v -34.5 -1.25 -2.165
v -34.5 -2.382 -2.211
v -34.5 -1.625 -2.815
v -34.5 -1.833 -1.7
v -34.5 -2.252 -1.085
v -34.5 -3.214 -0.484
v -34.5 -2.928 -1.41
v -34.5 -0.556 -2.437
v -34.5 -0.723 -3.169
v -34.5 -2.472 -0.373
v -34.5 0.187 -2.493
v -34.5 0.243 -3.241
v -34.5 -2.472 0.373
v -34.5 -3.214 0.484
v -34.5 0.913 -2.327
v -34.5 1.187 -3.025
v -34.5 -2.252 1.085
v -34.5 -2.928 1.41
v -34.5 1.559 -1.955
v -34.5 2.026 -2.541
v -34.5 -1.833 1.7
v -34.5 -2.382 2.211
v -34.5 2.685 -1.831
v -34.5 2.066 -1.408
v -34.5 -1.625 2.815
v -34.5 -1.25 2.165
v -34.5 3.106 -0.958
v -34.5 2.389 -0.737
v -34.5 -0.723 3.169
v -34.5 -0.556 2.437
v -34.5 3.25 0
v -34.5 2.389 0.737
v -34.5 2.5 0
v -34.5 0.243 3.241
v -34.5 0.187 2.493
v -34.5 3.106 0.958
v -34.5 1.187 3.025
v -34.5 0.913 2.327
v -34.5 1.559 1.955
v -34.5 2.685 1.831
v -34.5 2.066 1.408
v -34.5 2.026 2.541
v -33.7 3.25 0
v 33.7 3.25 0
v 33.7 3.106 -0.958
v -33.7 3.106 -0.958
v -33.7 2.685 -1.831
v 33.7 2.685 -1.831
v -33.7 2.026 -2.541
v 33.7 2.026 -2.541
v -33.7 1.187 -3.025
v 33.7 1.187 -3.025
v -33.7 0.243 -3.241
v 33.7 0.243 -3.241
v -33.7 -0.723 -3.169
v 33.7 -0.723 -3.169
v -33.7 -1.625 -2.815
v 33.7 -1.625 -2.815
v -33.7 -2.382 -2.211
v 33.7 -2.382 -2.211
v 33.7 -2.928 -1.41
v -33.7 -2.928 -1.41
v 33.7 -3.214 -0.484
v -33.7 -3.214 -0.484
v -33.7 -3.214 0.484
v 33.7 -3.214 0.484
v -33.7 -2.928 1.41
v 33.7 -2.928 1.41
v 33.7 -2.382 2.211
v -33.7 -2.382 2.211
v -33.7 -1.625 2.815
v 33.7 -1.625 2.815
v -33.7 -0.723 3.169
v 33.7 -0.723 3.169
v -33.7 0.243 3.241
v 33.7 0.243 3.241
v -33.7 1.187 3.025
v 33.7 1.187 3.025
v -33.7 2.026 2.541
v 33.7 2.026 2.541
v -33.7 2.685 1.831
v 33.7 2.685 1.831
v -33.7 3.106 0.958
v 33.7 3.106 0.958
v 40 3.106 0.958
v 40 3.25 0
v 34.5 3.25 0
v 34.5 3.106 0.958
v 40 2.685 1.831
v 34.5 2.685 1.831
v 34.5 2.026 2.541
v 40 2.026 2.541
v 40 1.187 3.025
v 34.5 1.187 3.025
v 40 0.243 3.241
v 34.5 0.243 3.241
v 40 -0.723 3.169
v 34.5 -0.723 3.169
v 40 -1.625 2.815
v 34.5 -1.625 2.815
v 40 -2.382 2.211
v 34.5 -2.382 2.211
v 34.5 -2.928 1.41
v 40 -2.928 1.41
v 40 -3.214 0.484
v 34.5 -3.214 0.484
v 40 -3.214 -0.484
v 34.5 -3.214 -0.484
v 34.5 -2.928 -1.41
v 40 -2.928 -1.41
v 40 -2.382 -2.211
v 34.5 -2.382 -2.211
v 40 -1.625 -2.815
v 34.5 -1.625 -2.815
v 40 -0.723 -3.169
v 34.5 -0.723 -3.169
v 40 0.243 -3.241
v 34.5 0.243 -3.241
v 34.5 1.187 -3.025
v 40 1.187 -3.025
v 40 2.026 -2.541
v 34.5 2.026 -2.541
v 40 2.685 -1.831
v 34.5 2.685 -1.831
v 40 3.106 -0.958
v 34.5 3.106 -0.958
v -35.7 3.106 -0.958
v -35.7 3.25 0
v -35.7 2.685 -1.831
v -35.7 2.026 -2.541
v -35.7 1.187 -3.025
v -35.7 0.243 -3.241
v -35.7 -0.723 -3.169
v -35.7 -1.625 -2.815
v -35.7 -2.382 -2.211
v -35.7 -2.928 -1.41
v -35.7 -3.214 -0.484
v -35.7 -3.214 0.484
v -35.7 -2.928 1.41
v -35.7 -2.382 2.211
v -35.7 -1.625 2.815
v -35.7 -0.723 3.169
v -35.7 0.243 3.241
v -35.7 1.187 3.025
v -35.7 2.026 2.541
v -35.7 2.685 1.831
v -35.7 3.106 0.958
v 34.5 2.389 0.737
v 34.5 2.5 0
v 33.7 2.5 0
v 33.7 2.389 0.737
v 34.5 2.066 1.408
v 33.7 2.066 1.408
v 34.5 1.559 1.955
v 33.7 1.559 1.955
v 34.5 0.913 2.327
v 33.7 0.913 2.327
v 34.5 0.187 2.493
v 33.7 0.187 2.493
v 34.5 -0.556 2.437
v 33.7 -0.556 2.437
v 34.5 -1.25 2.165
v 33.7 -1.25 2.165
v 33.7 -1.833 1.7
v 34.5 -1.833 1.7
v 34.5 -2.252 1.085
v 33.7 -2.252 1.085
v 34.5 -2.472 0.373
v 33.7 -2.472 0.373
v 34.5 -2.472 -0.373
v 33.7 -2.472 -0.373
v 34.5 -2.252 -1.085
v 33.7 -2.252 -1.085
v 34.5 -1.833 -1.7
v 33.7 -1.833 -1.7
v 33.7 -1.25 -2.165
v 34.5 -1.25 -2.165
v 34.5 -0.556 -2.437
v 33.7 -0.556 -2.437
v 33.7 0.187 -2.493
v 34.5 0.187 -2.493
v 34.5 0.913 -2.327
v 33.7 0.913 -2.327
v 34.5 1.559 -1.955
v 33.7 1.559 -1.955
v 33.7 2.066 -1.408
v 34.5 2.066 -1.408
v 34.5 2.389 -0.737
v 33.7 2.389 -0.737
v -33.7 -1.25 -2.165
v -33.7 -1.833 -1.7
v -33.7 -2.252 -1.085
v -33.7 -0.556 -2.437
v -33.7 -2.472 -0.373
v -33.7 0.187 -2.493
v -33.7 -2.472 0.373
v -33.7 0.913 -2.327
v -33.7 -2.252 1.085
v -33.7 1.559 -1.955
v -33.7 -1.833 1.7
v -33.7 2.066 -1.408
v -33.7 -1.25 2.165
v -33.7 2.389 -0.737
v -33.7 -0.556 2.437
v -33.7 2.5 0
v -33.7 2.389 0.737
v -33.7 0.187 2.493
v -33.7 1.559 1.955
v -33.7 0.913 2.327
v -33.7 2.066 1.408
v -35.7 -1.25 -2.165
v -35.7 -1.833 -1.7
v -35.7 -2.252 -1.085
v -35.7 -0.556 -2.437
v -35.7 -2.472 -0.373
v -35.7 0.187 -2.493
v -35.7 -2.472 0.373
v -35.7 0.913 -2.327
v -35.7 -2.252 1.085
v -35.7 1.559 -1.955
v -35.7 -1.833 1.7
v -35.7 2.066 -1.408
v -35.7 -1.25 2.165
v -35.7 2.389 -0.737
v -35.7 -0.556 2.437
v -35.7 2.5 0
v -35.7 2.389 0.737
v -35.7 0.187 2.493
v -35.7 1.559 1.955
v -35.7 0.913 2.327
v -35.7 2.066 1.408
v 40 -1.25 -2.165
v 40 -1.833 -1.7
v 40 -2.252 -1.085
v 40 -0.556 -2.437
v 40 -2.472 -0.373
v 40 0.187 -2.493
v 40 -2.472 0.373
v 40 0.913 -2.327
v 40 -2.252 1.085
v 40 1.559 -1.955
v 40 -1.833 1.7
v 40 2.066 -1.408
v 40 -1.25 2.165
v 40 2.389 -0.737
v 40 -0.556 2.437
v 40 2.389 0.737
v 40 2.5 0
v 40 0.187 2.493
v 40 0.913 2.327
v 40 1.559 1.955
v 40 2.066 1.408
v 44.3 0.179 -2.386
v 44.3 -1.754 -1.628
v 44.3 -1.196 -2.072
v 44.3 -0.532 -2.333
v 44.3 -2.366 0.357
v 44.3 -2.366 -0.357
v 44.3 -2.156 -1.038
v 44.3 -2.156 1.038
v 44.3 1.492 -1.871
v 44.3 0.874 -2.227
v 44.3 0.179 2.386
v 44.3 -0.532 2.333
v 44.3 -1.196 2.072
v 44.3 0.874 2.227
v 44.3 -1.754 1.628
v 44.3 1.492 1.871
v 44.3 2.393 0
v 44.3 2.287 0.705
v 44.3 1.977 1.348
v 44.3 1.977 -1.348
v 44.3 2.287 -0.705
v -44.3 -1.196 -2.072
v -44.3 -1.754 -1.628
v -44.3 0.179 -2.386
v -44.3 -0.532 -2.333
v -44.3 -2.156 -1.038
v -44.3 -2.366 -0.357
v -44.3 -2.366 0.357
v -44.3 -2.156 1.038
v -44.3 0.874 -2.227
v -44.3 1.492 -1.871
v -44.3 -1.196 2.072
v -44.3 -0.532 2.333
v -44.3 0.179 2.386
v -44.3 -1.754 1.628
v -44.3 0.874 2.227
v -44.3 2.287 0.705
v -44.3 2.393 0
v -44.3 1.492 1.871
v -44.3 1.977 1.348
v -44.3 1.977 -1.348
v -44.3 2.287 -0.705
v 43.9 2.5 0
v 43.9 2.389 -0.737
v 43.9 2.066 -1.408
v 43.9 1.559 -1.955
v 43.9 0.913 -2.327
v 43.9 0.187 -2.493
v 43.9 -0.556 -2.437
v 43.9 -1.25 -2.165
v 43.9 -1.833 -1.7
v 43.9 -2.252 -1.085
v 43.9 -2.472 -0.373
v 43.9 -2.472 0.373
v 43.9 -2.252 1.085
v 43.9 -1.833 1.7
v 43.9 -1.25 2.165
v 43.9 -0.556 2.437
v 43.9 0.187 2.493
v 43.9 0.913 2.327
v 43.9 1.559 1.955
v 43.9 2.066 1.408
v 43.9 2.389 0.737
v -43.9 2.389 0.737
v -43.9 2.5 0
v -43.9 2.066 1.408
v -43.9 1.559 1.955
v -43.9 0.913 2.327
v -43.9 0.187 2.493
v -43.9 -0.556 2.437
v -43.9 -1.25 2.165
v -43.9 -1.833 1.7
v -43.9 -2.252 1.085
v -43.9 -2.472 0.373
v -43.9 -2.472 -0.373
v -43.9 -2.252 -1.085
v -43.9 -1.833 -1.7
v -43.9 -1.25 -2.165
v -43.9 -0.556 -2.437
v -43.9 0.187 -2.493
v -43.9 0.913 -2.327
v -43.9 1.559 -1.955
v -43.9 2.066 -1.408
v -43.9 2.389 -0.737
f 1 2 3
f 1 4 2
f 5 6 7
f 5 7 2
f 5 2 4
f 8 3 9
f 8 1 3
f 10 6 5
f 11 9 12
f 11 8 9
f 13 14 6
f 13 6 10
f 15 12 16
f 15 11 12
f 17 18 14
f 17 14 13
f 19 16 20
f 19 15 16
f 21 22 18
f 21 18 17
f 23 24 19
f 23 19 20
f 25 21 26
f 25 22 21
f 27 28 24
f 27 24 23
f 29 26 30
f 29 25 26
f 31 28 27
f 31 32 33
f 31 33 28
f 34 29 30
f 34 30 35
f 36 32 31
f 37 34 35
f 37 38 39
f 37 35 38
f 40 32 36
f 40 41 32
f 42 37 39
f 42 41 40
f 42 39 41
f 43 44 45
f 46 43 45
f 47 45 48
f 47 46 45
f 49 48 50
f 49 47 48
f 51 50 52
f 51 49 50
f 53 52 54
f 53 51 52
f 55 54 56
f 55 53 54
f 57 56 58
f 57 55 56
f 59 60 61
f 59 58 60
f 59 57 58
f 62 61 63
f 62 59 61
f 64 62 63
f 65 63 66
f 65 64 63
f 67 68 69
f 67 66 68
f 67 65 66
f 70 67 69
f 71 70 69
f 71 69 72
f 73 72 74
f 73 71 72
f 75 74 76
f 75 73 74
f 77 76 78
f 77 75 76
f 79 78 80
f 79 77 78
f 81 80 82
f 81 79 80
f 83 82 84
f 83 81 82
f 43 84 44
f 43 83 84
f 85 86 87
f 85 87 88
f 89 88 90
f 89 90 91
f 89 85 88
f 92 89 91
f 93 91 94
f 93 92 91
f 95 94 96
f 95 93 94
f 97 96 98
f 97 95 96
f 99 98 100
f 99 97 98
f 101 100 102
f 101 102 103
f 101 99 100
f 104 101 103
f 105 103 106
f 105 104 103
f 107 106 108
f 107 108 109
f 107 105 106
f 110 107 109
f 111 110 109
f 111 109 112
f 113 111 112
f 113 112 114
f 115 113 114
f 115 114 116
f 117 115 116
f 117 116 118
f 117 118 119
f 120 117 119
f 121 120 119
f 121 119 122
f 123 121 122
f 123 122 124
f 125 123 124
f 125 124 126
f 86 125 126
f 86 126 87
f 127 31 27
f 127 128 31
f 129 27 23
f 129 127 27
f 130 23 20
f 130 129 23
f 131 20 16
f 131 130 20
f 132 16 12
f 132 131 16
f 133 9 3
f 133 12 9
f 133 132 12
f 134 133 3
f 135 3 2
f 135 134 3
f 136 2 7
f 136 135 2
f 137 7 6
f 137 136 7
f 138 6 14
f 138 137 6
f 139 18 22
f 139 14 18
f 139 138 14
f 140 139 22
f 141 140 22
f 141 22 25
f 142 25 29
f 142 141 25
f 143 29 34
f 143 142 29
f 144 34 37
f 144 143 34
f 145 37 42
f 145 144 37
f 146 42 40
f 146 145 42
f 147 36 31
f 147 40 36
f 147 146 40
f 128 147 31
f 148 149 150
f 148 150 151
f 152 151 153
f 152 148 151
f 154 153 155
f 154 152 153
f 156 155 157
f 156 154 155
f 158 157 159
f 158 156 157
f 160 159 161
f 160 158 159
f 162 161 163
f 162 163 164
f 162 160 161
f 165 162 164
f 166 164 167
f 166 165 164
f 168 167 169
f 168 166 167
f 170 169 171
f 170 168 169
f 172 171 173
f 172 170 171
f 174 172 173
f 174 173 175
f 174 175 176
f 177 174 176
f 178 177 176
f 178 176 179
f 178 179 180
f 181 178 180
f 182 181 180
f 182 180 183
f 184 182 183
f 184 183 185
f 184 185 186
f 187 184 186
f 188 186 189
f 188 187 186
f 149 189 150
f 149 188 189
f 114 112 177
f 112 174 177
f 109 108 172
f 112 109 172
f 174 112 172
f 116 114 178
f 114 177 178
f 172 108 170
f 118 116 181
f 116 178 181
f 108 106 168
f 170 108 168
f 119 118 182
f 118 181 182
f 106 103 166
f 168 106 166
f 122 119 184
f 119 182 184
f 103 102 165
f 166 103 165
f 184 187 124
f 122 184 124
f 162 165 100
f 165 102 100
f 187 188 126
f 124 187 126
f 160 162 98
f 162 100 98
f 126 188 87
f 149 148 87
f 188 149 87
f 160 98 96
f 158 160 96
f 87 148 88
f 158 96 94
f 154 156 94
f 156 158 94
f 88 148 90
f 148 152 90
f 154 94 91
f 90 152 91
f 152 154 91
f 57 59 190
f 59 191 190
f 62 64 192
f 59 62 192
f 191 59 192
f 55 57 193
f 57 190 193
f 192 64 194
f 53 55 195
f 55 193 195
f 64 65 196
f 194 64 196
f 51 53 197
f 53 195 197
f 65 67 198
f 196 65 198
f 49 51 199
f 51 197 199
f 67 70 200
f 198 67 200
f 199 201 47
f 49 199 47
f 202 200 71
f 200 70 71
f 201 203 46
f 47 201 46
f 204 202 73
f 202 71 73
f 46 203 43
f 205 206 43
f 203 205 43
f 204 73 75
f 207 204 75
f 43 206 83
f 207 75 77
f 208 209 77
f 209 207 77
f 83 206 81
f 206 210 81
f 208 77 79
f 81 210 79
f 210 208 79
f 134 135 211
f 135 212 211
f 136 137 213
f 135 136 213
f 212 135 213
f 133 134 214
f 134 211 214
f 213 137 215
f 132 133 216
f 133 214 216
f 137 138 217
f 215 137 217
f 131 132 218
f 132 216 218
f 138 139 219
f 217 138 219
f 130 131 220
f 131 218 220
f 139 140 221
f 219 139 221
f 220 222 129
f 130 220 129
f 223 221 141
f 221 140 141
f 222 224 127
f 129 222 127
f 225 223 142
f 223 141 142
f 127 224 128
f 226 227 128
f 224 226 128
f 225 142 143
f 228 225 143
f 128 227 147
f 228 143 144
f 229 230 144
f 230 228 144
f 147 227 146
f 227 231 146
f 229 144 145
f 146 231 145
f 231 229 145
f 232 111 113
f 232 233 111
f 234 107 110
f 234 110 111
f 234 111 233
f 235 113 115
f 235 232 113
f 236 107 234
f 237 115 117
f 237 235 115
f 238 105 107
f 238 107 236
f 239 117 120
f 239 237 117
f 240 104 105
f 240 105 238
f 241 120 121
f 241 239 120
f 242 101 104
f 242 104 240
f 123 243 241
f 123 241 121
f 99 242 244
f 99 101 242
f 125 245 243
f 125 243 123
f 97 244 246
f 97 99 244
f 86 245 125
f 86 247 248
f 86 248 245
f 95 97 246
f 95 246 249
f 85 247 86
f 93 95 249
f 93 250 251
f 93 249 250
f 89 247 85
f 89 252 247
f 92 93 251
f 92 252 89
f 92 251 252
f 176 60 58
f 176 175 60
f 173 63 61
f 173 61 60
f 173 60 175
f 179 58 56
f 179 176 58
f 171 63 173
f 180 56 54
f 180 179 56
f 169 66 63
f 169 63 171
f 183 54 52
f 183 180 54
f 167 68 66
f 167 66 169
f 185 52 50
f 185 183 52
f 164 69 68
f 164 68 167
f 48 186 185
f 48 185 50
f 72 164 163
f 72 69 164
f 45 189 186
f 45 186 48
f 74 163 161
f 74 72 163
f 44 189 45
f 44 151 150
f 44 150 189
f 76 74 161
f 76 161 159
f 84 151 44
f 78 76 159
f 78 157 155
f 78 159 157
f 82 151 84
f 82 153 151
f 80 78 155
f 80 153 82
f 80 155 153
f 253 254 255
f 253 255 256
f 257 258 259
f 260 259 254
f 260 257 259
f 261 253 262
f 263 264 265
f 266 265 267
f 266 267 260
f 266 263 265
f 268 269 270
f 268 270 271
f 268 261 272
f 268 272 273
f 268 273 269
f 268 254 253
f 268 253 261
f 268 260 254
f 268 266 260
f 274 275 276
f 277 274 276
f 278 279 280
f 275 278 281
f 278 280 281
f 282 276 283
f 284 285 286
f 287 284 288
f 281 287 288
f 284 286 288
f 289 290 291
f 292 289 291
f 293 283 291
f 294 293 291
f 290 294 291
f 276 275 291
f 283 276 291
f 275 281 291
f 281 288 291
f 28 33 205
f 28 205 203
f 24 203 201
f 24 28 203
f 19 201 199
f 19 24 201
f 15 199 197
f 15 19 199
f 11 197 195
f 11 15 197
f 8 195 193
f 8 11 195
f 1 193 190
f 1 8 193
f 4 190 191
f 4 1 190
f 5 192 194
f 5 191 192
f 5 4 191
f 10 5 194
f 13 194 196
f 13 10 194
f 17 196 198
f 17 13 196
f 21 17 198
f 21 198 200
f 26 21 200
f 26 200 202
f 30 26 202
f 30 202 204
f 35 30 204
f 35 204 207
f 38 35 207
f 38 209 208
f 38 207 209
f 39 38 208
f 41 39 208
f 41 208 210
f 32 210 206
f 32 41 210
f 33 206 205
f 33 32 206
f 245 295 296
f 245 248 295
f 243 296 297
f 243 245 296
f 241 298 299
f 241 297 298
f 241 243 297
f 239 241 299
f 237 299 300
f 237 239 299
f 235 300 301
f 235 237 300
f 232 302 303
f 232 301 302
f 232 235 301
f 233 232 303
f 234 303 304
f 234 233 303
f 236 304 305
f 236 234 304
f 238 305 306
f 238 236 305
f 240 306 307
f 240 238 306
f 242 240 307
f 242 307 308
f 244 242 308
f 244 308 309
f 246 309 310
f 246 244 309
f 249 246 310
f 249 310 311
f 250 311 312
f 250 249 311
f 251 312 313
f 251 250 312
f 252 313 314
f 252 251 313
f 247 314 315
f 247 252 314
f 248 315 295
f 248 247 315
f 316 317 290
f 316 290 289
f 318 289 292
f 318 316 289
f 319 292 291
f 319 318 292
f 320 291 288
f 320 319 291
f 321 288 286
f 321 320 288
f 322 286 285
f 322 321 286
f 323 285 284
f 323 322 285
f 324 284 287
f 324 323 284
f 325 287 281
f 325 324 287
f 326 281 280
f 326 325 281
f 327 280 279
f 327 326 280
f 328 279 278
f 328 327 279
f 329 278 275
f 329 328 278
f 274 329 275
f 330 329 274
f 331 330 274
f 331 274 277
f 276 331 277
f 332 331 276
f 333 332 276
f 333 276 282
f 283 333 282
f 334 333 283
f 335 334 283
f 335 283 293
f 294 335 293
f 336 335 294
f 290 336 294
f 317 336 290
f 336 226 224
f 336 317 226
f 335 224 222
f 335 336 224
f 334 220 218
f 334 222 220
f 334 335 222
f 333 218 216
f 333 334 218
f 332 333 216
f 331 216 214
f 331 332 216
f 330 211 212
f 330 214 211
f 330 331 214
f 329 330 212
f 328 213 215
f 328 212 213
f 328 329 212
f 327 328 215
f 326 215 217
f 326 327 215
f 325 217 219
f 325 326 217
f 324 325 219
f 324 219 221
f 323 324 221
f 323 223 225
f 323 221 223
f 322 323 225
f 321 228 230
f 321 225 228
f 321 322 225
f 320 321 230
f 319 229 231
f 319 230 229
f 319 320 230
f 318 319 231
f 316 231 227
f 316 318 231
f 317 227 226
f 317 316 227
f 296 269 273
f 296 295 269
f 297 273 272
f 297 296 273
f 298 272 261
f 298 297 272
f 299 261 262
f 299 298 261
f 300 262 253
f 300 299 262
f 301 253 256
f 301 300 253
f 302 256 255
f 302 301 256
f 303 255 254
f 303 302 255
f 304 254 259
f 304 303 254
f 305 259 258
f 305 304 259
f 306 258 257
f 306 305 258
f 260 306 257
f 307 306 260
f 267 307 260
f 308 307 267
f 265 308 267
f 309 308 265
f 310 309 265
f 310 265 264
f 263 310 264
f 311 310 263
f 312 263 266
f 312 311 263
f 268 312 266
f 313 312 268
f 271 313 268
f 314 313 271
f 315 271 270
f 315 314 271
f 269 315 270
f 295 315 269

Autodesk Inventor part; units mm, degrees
ref_plane "YZ Plane" through (0, 0, 0) normal (1, 0, 0) x (0, 1, 0)
ref_plane "XZ Plane" through (0, 0, 0) normal (0, 1, 0) x (-1, 0, 0)
ref_plane "XY Plane" through (0, 0, 0) normal (0, 0, 1) x (1, 0, 0)
sketch "Skizze1" plane through (0, 0, 0) normal (0, 0, 1) x (1, 0, 0)
  line L0 (-44.3, 0) -> (44.3, 0)
  line L1 (44.3, 0) -> (44.3, 2.5)
  line L2 (44.3, 2.5) -> (40, 2.5)
  line L3 (40, 2.5) -> (40, 3.25)
  line L4 (33.7, 3.25) -> (-33.7, 3.25)
  line L5 (-35.7, 3.25) -> (-35.7, 2.5)
  line L6 (-35.7, 2.5) -> (-44.3, 2.5)
  line L7 (-44.3, 2.5) -> (-44.3, 0)
  line L8 (0, 3.9) -> (0, -0.65) projected
  line L9 (-39.8, 2.5) -> (-39.8, 0) construction
  line L10 (-33.7, 3.25) -> (-33.7, 2.5)
  line L11 (-33.7, 2.5) -> (-34.5, 2.5)
  line L12 (-34.5, 2.5) -> (-34.5, 3.25)
  line L13 (-34.5, 3.25) -> (-35.7, 3.25)
  line L14 (33.7, 3.25) -> (33.7, 2.5)
  line L15 (33.7, 2.5) -> (34.5, 2.5)
  line L16 (34.5, 2.5) -> (34.5, 3.25)
  line L17 (34.5, 3.25) -> (40, 3.25)
  point P0 (0, 0)
  dimension "d1" = 4.3
  dimension "d2" = 5
  dimension "d4" = 6.5
  dimension "d18" = 5
  dimension "d20" = 79.8
  dimension "d22" = 4.1
  dimension "d23" = 4.5
  dimension "d24" = 1.2
  dimension "d25" = 0.8
  dimension "d26" = 5
revolve "Umdrehung1" add sketch "Skizze1" angle 360 about axis through (-44.3, 0, 0) along (1, 0, 0)
chamfer "Fase2" distance 0.4 angle 15 1 edges at (-44.3, -2.5, 0) measured on face at (-41.4333, 2.4676, -0.401)
chamfer "Fase3" distance 0.4 angle 15 1 edges at (44.3, -2.5, 0) measured on face at (41.4333, 2.4676, -0.401)
properties part number "Dribblingwelle" material "Aluminium 6061"
